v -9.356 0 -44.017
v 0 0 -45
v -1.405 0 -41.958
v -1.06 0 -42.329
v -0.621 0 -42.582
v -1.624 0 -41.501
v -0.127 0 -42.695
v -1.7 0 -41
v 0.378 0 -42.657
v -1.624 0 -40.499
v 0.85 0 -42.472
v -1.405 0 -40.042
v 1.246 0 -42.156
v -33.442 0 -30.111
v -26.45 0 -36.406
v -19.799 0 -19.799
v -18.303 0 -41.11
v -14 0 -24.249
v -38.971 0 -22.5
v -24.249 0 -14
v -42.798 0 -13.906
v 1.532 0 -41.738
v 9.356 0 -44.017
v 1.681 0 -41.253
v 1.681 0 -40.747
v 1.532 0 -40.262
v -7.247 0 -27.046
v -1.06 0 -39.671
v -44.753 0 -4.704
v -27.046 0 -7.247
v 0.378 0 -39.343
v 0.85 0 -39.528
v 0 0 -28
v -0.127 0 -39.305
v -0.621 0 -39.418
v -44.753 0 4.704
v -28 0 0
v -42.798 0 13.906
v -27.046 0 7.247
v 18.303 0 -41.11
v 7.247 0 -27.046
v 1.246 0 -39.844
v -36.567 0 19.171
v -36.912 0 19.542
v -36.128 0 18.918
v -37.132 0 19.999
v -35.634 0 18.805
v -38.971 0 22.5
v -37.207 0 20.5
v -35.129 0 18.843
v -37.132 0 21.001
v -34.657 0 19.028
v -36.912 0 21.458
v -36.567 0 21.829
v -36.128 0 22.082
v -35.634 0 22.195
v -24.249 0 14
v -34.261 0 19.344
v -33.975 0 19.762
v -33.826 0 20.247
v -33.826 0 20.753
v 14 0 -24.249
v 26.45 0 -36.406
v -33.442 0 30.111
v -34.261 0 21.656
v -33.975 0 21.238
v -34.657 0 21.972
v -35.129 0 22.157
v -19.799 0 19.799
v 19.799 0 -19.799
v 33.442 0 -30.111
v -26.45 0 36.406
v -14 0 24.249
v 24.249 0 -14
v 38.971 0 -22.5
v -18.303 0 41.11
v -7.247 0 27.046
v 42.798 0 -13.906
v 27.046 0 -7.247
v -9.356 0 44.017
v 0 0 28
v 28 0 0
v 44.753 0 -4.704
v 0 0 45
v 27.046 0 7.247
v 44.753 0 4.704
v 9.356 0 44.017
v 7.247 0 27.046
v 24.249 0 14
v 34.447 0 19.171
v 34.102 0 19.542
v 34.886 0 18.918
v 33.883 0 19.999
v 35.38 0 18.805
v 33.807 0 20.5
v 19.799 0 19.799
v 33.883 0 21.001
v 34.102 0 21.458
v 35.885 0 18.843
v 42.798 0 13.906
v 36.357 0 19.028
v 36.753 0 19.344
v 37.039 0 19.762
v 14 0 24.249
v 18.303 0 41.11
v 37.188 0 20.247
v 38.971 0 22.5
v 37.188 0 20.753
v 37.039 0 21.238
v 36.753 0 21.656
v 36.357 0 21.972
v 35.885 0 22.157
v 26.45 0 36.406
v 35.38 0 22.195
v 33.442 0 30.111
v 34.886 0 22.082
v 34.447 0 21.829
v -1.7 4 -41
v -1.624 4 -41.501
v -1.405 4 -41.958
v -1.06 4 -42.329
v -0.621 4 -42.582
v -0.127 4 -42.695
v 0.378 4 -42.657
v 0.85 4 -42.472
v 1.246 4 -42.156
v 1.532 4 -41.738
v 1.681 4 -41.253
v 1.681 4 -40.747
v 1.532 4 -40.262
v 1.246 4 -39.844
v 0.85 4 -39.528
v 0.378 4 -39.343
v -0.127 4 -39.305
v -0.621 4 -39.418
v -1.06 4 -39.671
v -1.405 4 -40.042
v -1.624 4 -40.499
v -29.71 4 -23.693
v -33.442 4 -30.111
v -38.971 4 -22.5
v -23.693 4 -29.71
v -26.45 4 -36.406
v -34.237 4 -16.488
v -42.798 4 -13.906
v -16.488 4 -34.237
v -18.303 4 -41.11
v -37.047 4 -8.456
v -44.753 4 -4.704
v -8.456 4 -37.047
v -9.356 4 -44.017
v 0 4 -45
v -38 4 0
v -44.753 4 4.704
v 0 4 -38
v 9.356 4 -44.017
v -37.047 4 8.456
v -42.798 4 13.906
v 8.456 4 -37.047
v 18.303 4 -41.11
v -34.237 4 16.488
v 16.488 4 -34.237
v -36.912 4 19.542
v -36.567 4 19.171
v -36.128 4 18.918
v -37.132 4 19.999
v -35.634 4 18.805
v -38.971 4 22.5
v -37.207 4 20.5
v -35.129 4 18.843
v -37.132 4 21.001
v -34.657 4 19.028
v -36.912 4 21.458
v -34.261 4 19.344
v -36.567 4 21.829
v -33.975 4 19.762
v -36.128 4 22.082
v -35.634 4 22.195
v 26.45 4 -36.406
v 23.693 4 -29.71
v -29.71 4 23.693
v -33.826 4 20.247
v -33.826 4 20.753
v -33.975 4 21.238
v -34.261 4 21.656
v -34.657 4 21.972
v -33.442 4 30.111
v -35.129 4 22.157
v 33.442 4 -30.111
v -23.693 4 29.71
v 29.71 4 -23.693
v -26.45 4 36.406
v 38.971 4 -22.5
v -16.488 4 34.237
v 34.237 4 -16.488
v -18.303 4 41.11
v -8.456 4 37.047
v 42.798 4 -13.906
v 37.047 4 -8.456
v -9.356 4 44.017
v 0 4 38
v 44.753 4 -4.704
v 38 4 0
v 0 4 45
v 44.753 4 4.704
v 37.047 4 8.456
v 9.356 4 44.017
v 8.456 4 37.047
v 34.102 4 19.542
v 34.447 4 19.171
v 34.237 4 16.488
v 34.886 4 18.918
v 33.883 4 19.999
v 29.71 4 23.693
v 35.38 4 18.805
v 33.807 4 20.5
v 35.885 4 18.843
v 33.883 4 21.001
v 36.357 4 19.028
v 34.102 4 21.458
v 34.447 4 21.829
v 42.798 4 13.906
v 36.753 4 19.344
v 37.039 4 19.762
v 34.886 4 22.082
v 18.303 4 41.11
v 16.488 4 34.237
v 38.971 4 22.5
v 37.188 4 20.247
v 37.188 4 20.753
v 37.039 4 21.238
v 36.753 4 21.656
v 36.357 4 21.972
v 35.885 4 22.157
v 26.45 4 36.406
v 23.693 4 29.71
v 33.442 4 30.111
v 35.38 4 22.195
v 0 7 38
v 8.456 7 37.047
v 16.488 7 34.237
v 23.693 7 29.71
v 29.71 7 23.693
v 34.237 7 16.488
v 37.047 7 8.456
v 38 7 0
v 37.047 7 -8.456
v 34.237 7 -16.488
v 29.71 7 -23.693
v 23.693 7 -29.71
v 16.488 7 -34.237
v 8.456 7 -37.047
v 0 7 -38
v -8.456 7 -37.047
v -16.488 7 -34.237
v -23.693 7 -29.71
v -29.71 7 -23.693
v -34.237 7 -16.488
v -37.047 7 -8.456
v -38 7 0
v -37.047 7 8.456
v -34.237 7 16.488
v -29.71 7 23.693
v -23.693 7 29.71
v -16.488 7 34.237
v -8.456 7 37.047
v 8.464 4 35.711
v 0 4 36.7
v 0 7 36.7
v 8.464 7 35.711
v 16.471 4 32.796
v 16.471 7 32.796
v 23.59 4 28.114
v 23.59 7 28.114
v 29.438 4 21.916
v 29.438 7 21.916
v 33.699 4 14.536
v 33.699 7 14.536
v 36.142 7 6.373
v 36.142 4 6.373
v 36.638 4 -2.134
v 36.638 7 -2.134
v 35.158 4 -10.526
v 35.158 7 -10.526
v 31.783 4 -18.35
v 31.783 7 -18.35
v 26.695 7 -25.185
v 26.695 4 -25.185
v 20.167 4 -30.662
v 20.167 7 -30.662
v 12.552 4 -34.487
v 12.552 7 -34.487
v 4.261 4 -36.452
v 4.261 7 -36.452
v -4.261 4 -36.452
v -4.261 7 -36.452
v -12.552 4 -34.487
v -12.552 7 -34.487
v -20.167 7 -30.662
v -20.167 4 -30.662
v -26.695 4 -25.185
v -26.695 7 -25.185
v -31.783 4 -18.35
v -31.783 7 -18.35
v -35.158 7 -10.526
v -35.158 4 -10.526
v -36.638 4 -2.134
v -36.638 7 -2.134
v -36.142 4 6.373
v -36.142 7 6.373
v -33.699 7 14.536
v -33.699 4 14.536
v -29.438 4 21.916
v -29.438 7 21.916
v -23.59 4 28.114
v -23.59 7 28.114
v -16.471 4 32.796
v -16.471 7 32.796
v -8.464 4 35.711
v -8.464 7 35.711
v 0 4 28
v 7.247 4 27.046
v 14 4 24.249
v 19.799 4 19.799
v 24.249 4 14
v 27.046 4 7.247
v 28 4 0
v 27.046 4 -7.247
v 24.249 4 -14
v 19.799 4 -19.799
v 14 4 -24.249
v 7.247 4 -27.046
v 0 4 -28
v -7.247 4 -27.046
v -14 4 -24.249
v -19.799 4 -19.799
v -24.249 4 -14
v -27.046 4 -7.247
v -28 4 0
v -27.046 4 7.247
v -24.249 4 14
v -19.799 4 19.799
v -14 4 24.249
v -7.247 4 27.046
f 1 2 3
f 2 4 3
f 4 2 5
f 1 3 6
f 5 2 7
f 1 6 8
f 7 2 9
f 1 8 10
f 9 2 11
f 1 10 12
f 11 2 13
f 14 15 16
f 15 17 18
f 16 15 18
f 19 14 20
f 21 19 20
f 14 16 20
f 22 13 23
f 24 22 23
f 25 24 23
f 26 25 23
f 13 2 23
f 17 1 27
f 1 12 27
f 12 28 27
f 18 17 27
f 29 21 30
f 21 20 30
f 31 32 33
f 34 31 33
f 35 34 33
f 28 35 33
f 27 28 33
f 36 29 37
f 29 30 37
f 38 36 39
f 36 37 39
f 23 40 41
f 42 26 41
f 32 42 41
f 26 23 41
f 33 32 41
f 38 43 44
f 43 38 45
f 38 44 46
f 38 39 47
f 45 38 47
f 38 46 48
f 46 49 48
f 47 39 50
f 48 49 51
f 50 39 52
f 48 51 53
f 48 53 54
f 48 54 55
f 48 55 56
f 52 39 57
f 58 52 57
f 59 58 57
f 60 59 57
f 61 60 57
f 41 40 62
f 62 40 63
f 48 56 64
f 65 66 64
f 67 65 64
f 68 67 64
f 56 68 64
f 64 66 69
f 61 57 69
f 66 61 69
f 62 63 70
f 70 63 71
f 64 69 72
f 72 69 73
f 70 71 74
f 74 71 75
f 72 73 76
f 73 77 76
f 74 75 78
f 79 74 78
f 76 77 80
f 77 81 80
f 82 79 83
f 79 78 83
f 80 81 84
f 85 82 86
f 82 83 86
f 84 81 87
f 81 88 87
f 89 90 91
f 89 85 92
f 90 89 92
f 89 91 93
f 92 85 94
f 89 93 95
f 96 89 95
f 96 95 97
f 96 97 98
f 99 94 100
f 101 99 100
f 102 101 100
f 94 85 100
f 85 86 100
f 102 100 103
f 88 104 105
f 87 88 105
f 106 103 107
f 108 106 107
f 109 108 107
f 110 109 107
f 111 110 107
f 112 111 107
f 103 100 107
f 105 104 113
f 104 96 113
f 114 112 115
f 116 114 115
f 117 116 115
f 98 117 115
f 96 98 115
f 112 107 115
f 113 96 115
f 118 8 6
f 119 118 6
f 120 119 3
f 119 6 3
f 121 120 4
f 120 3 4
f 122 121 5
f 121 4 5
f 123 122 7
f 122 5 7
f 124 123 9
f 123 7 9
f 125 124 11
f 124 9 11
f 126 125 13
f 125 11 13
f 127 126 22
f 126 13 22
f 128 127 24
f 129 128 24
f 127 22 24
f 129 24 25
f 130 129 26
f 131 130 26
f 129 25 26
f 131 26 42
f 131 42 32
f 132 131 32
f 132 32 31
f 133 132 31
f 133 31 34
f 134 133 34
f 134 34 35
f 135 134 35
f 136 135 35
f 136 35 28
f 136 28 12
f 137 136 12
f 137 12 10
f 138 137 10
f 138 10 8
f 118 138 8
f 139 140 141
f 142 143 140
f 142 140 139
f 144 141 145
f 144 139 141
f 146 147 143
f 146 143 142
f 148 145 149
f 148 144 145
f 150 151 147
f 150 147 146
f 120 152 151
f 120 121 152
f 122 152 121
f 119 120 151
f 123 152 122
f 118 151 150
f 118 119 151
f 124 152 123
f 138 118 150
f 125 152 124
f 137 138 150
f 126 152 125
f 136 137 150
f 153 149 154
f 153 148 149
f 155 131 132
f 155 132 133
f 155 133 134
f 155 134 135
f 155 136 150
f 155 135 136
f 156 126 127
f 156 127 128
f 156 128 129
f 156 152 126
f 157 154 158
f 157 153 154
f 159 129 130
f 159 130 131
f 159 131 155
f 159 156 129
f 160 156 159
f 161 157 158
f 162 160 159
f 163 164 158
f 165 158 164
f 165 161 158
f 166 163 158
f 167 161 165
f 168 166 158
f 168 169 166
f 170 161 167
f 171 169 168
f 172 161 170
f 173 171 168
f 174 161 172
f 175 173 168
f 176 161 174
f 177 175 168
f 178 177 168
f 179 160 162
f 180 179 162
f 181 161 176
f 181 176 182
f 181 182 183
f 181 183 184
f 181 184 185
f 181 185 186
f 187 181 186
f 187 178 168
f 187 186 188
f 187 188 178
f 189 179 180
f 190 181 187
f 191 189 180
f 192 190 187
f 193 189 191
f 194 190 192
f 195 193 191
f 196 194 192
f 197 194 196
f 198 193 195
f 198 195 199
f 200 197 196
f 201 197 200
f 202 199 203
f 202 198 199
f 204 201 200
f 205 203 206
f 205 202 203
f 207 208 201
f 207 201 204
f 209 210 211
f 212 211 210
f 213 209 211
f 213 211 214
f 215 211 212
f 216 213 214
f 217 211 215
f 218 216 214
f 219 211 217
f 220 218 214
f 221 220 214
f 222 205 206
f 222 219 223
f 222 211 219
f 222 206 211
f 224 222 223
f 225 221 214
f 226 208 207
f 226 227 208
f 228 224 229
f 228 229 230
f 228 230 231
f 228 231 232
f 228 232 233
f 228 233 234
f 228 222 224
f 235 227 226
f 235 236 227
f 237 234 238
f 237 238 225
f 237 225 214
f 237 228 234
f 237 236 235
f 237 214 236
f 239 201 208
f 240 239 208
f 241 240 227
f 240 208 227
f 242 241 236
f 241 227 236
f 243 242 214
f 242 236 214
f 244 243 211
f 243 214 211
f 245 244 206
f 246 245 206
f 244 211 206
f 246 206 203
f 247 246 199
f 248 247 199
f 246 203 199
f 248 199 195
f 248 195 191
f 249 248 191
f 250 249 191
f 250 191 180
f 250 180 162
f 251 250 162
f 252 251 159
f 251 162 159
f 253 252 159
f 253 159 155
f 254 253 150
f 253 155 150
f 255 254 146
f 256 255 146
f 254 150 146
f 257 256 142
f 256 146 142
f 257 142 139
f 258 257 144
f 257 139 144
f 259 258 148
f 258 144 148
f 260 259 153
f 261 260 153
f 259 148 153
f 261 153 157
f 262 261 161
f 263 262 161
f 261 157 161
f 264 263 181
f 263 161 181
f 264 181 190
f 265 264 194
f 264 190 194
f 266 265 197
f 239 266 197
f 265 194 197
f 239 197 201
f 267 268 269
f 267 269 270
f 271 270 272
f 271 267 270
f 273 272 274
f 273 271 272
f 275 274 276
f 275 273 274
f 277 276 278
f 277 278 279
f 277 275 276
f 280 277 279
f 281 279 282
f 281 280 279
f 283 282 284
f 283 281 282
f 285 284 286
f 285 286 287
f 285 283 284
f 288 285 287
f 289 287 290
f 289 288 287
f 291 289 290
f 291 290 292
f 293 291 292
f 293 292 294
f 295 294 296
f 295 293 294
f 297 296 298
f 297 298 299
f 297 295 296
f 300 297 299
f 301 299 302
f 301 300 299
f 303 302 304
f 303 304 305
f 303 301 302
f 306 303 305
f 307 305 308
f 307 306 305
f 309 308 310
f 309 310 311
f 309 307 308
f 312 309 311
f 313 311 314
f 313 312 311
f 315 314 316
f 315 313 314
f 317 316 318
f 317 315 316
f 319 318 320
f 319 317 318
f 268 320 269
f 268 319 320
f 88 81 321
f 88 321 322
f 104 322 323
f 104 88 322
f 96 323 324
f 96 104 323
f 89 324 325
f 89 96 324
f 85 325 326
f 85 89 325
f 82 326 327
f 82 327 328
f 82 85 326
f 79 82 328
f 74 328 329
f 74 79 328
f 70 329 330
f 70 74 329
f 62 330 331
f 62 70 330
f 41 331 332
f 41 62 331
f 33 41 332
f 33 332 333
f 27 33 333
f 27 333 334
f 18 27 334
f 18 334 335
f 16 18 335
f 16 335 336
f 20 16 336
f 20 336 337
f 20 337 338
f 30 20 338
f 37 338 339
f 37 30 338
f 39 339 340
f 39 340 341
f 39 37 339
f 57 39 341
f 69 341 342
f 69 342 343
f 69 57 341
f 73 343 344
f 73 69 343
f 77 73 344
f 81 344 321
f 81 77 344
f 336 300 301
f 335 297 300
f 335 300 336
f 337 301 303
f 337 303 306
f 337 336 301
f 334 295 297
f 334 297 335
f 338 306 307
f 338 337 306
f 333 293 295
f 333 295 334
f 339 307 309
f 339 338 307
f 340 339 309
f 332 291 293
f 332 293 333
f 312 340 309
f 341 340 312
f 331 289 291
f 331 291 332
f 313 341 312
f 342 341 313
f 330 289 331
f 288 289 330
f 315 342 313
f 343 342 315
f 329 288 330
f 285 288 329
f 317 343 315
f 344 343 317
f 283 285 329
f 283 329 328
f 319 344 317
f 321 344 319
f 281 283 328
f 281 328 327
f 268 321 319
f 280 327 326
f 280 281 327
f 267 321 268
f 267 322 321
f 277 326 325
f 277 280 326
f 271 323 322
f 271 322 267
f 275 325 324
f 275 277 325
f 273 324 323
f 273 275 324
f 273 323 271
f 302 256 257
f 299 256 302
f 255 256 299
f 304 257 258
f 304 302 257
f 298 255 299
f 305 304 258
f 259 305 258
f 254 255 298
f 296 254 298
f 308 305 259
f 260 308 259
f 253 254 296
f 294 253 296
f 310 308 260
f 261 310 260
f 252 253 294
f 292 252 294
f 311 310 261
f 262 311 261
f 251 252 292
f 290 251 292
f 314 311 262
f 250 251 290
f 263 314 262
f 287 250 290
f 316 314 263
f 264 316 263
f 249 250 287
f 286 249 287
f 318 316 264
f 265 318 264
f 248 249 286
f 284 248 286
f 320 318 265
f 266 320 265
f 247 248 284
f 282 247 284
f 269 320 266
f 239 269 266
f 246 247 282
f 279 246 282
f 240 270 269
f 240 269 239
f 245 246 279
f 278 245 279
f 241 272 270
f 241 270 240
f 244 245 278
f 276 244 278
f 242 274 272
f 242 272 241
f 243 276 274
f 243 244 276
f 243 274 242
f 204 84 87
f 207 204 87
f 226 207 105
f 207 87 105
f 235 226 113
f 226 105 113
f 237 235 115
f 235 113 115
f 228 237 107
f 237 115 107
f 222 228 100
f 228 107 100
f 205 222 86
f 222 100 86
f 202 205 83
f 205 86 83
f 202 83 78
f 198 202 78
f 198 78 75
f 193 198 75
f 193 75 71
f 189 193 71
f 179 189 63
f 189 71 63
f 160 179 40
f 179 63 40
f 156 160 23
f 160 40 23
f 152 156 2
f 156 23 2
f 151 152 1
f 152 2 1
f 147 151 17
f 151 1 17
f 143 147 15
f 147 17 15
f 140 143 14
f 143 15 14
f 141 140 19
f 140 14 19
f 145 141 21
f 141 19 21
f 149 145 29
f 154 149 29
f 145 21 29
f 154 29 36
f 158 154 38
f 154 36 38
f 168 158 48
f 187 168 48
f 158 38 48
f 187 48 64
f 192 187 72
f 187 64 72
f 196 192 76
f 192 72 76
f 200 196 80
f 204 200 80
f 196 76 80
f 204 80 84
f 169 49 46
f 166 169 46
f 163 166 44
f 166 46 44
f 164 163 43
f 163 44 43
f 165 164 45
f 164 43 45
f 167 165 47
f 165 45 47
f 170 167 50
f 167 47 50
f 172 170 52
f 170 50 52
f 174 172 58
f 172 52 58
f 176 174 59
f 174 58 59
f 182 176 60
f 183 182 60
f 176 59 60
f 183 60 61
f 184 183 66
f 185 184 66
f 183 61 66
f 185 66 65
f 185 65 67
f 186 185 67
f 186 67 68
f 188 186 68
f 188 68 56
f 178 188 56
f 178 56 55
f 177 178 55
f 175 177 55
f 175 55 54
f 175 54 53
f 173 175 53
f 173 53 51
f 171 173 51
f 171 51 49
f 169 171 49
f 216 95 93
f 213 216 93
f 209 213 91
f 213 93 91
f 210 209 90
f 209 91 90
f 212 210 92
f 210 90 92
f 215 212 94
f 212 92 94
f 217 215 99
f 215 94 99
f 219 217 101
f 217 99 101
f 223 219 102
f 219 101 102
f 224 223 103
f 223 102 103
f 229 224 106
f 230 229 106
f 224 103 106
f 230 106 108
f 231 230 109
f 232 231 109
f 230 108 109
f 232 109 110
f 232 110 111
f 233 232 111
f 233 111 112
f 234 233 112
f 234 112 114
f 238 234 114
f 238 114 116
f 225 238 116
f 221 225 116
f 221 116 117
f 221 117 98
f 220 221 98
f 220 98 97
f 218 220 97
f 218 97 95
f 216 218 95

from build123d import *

# Parameters (mm, degrees)
SKETCH1_R                          = 45
SKETCH1_R_2                        = 28
COLLAR_ANNULUS_OD90_ID56_T4_DEPTH  = 4
SKETCH2_R                          = 38
SKETCH2_R_2                        = 36.7
RETAINING_RIM_OD76_ID73_4_H3_DEPTH = 3
MOUNTING_HOLES_3X_3_4_PCD82_D      = 3.4


with BuildPart() as part:
    # Sketch1 → Collar_Annulus_OD90_ID56_T4 (new body)
    with BuildSketch(Plane(origin=(0, 0, 0), x_dir=(1, 0, 0), z_dir=(0, 1, 0))):
        with Locations(Location((0, 0, 0), (0, 0, 270))):
            Circle(SKETCH1_R)
        with Locations(Location((0, 0, 0), (0, 0, 270))):
            Circle(SKETCH1_R_2, mode=Mode.SUBTRACT)
    extrude(amount=COLLAR_ANNULUS_OD90_ID56_T4_DEPTH)

    # Sketch2 → Retaining_Rim_OD76_ID73.4_H3 (add)
    with BuildSketch(Plane(origin=(0, 4, 0), x_dir=(1, 0, 0), z_dir=(0, 1, 0))):
        with Locations(Location((0, 0, 0), (0, 0, 270))):
            Circle(SKETCH2_R)
        with Locations(Location((0, 0, 0), (0, 0, 270))):
            Circle(SKETCH2_R_2, mode=Mode.SUBTRACT)
    extrude(amount=RETAINING_RIM_OD76_ID73_4_H3_DEPTH)

    # Mounting_Holes_3xØ3.4_PCD82 (through all)
    with Locations(Plane(origin=(0, 4, 0), x_dir=(1, 0, 0), z_dir=(0, 1, 0))):
        with Locations((-35.507041555, -20.5), (0, 41), (35.507041555, -20.5)):
            Hole(MOUNTING_HOLES_3X_3_4_PCD82_D / 2)


solid = part.part
